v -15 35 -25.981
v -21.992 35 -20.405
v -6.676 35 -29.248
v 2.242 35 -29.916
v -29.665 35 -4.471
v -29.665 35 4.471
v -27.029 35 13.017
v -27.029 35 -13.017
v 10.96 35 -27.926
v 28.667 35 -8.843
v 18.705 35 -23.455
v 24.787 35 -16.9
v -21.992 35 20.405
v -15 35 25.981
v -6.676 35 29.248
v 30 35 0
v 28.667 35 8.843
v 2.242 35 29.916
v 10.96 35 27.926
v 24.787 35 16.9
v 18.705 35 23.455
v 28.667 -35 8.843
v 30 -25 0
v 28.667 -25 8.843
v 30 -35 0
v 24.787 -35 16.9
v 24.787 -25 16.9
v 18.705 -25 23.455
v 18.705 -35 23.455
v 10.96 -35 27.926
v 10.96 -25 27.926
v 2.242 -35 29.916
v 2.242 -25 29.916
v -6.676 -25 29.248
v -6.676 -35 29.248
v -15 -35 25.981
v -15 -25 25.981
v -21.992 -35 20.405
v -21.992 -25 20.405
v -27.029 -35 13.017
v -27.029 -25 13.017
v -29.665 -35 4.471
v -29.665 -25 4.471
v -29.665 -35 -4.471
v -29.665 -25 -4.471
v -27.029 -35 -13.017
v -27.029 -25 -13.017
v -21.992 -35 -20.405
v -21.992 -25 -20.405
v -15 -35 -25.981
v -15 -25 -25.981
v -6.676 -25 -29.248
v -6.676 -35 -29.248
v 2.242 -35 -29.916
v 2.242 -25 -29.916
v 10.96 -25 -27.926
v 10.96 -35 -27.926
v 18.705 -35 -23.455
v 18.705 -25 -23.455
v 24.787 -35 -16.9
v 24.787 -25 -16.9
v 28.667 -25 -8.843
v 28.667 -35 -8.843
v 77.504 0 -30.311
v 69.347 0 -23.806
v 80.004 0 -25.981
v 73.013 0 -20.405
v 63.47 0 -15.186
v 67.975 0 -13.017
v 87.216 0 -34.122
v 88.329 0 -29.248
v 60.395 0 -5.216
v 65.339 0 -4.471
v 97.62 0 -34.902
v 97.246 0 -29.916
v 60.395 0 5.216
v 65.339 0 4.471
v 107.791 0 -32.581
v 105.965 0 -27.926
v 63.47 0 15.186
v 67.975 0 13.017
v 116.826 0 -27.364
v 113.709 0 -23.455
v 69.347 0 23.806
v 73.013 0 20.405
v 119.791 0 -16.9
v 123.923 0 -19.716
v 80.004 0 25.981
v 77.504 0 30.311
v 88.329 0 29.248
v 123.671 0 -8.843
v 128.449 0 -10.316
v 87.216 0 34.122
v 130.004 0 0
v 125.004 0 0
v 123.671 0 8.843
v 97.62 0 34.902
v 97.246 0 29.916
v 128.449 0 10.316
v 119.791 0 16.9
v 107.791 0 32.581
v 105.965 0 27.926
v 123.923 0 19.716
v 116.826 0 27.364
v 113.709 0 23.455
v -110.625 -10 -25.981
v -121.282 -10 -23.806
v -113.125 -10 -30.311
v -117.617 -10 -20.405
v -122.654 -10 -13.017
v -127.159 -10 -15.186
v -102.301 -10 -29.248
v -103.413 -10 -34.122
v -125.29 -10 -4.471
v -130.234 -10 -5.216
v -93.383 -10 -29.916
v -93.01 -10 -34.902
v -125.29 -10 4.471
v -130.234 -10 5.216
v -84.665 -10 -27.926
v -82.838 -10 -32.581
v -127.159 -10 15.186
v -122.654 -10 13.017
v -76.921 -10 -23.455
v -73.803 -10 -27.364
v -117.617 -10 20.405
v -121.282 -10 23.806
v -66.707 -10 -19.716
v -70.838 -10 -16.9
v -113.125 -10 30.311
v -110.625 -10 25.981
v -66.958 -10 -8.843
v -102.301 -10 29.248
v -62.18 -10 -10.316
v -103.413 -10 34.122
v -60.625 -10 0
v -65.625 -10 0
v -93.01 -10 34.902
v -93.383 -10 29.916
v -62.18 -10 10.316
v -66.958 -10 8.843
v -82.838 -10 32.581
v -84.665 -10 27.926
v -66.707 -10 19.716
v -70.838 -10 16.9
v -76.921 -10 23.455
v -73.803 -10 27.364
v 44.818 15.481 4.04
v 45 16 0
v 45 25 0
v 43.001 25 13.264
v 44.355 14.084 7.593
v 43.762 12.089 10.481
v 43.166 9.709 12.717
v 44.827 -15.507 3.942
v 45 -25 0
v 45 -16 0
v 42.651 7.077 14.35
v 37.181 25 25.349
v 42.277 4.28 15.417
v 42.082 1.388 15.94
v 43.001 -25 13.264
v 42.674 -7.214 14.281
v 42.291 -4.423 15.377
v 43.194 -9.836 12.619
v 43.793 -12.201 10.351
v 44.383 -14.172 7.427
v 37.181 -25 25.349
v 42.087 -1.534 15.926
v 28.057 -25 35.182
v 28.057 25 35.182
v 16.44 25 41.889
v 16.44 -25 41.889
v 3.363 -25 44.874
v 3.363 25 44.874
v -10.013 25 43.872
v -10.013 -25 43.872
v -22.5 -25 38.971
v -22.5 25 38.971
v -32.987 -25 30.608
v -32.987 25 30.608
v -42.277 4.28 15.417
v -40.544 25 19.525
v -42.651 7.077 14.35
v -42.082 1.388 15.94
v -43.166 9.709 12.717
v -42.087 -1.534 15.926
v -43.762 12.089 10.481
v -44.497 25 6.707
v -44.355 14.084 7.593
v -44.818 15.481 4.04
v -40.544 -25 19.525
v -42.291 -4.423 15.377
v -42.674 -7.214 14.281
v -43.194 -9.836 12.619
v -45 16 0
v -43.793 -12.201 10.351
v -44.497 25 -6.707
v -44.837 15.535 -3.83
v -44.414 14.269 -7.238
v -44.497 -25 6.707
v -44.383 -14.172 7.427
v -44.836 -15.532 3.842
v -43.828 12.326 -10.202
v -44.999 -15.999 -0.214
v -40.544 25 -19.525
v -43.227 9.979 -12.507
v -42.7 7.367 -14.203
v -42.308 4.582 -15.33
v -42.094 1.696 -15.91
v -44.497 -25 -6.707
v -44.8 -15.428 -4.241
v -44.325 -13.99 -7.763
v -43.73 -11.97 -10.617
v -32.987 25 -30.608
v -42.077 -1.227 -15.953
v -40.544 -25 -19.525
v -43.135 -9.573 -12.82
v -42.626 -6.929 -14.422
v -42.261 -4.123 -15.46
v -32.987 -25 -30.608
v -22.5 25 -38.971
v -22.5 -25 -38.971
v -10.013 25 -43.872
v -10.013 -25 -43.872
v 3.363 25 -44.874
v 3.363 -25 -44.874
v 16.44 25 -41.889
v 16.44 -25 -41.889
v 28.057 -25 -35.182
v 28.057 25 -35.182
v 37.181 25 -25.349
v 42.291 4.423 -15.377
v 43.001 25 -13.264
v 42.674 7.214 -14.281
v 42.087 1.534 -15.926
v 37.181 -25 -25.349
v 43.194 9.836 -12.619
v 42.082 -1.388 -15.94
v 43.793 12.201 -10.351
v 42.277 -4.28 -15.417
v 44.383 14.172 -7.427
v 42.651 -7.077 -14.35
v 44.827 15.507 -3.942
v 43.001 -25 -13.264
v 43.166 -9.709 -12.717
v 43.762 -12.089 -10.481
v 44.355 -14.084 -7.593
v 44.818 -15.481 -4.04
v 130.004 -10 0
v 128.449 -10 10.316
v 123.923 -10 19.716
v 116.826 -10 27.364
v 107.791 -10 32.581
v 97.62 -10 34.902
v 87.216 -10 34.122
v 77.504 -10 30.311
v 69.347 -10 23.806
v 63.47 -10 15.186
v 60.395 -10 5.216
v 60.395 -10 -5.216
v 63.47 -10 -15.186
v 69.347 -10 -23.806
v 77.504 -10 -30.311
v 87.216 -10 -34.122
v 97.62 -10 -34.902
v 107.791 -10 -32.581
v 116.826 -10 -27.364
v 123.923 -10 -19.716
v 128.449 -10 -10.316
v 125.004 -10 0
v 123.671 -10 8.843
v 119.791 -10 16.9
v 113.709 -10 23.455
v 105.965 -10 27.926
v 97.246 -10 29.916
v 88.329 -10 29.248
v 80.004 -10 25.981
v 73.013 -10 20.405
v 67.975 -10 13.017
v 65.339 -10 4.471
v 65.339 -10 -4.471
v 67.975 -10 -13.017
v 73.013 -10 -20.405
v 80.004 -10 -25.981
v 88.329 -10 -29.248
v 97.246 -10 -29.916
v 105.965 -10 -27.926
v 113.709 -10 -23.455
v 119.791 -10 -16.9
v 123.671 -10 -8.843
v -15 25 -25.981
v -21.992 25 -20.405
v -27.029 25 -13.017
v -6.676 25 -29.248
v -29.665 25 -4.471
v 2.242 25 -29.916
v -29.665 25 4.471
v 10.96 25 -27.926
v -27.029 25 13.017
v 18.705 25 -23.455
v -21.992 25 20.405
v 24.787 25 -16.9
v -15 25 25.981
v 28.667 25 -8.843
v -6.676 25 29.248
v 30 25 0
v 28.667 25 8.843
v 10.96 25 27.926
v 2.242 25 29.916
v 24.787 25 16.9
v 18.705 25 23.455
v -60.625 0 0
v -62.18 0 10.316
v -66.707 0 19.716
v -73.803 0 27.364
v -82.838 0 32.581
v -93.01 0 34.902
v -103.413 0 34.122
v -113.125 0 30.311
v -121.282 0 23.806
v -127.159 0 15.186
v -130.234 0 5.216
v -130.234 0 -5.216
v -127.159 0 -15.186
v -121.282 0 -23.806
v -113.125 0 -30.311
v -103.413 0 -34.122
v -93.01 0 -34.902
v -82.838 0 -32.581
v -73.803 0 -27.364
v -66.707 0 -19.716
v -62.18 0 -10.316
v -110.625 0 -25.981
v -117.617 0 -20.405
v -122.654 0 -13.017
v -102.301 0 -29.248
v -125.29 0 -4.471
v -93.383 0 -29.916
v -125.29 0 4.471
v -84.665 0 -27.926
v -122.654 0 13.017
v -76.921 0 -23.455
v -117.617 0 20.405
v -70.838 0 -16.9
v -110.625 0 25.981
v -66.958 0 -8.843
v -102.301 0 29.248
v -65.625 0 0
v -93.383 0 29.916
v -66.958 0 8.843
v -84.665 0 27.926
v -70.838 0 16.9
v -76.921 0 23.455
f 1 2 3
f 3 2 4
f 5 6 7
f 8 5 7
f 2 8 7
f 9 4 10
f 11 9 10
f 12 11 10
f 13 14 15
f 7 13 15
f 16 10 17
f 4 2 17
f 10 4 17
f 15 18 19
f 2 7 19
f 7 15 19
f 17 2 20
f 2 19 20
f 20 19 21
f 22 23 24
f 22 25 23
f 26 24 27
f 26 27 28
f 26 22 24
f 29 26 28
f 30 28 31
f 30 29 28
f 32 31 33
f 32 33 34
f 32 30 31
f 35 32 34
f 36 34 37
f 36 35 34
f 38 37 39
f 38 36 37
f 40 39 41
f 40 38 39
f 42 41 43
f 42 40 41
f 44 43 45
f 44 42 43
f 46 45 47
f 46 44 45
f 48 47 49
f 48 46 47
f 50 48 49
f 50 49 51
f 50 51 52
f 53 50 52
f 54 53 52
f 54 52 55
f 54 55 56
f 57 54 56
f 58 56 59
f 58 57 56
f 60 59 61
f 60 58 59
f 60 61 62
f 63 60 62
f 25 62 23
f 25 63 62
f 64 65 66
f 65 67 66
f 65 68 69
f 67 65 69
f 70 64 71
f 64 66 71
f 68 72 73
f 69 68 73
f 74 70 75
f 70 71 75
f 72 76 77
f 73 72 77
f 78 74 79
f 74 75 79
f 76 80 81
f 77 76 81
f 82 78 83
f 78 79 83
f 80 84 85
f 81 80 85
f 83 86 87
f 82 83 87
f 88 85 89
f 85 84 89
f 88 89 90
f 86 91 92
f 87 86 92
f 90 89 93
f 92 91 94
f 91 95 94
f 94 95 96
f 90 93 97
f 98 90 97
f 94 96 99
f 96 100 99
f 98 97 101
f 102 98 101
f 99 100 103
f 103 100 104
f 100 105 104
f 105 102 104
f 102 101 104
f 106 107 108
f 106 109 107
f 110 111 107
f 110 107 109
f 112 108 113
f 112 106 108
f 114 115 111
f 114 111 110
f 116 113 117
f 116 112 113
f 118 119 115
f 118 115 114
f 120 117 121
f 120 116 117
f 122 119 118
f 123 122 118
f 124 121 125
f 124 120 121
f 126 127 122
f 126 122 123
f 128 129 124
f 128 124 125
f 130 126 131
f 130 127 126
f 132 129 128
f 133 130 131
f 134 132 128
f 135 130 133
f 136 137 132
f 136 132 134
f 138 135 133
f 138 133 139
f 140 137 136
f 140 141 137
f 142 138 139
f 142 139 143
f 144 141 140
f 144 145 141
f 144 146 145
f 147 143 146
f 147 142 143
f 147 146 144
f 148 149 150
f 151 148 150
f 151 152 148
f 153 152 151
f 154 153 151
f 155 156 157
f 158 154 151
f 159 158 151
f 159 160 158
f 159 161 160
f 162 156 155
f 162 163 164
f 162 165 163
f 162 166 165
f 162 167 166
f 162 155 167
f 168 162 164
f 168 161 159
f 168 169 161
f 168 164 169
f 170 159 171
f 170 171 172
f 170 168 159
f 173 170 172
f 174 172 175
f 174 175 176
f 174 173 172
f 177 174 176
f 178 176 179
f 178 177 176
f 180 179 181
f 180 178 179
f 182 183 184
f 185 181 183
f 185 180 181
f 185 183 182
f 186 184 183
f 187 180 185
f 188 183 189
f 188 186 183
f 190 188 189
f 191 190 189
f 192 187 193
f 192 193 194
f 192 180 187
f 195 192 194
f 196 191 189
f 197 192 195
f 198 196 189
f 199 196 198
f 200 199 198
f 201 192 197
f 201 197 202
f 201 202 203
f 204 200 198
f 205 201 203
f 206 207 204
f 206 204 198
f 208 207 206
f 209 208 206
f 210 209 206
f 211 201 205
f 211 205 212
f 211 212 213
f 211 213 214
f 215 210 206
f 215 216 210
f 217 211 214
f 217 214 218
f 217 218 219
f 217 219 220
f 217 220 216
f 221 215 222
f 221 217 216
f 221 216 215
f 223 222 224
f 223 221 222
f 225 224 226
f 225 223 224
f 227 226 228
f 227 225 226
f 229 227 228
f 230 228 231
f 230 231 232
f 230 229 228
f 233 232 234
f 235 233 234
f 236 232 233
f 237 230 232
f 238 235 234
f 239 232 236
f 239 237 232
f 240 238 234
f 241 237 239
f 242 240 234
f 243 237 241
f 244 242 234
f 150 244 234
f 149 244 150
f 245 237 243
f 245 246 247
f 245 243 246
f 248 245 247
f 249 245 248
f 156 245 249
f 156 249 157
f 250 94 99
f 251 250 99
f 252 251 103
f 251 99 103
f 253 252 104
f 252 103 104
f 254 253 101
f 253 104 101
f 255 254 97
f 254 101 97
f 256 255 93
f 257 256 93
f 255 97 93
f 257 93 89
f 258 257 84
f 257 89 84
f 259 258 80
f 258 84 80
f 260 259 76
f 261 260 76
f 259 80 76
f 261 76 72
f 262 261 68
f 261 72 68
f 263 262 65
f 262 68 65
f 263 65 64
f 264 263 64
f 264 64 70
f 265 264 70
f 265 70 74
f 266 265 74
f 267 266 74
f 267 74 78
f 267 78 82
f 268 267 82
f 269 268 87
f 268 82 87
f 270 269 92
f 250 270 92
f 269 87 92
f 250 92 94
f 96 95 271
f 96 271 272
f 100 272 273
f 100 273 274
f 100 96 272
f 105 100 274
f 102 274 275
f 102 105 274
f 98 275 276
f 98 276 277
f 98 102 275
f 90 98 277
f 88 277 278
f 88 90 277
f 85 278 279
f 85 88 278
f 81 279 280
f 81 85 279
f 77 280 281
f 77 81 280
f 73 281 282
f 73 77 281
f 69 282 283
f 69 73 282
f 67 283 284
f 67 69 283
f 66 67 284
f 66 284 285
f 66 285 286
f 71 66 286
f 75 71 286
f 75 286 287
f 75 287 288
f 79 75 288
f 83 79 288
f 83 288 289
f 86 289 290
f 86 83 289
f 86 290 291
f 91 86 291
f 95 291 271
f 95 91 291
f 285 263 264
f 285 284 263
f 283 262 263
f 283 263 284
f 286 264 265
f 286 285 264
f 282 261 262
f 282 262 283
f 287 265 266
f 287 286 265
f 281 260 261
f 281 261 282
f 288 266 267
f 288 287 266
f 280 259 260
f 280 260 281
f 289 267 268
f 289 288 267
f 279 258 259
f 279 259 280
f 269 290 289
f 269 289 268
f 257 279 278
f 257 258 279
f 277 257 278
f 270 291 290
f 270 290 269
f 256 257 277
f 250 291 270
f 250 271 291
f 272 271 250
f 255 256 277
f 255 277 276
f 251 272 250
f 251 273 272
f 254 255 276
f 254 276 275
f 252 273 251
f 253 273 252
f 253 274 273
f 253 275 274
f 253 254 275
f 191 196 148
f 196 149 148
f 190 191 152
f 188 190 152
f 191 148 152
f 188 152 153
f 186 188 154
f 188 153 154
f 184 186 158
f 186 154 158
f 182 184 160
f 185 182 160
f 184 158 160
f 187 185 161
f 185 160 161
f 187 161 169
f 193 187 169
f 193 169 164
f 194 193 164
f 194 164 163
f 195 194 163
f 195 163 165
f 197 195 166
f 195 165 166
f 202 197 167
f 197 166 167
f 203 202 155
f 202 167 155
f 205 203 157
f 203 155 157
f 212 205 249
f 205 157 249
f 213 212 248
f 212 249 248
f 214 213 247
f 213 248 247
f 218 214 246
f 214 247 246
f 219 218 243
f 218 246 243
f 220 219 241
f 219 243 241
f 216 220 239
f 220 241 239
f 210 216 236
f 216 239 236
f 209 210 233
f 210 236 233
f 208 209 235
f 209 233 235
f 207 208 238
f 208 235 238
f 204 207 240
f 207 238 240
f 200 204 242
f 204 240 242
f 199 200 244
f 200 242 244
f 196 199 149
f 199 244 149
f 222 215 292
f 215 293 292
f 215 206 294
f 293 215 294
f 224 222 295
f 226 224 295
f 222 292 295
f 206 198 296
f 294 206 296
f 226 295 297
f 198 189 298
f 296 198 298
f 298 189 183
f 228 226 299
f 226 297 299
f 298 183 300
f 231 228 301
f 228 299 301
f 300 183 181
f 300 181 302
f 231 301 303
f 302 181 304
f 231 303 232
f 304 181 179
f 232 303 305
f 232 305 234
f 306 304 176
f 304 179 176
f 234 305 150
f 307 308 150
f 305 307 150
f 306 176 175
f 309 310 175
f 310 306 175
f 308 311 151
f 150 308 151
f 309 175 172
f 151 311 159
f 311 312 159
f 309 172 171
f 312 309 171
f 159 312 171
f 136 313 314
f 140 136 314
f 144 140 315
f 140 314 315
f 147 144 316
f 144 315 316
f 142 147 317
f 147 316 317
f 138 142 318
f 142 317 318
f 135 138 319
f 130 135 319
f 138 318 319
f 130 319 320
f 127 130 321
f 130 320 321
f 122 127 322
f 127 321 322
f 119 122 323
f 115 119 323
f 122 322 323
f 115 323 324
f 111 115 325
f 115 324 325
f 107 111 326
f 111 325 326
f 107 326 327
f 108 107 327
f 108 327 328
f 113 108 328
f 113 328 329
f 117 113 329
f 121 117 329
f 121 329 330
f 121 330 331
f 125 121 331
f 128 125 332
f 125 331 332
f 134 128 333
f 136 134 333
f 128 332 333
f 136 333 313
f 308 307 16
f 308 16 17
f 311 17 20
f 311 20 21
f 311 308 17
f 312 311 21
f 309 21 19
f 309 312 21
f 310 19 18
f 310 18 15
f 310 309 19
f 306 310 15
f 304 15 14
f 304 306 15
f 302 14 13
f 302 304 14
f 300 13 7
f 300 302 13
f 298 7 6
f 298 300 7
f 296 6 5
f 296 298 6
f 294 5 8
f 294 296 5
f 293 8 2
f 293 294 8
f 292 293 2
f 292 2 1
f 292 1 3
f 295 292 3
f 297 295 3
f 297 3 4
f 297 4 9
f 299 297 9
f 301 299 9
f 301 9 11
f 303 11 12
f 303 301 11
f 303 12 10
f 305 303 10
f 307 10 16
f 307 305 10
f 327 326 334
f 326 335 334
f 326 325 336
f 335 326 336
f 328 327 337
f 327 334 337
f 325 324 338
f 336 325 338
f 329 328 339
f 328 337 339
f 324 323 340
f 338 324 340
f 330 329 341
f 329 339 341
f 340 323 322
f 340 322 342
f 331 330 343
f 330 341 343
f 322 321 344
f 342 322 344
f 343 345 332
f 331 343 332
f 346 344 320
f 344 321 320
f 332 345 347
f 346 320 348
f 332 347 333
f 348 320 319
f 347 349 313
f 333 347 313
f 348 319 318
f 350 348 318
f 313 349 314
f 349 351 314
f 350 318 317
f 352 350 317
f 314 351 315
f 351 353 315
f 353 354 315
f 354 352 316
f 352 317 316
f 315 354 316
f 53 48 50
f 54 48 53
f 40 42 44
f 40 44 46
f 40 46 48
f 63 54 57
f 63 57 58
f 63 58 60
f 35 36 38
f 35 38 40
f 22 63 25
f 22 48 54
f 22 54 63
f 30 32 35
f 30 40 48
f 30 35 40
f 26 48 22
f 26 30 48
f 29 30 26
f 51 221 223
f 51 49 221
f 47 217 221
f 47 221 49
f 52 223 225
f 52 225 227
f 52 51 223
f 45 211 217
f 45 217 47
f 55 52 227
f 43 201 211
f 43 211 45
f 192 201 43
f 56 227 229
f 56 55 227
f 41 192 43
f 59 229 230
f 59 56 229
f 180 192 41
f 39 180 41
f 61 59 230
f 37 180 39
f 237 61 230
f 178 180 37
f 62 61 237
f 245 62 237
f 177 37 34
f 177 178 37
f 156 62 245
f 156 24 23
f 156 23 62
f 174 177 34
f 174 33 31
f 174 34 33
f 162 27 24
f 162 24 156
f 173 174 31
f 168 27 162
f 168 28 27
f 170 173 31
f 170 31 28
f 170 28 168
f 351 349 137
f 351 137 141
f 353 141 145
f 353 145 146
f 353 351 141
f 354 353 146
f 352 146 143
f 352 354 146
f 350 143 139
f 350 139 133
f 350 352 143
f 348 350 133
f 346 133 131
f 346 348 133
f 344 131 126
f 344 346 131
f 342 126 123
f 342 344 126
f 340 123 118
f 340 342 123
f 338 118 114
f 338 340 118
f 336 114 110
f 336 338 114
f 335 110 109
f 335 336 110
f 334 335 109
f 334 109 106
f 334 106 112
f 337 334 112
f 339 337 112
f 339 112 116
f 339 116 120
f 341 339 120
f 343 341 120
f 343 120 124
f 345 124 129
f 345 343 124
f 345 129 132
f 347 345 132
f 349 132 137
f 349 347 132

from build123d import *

# Parameters (mm, degrees)
F0_R     = 30
F1_DEPTH = 35
F0_R_2   = 45
F2_DEPTH = 25
F3_R     = 16
F4_DEPTH = 45
F5_R     = 35
F5_R_2   = 30
F6_DEPTH = 10


with BuildPart() as f1:
    # F0 (on Front) → F1 (new body, symmetric)
    with BuildSketch(Plane.XZ):
        Circle(F0_R)
    extrude(amount=F1_DEPTH, both=True)

    # F0 (on Front) → F2 (join, symmetric)
    with BuildSketch(Plane.XZ):
        Circle(F0_R_2)
        Circle(F0_R, mode=Mode.SUBTRACT)
    extrude(amount=F2_DEPTH, both=True)

    # F3 (on Right) → F4 (cut, symmetric)
    with BuildSketch(Plane.YZ):
        Circle(F3_R)
    extrude(amount=F4_DEPTH, both=True, mode=Mode.SUBTRACT)


with BuildPart() as f6:
    # F5 (on Front) → F6 (new body)
    with BuildSketch(Plane.XZ):
        with Locations((95.004305, 0)):
            Circle(F5_R)
        with Locations((95.004305, 0)):
            Circle(F5_R_2, mode=Mode.SUBTRACT)
        with Locations((-95.625247, 0)):
            Circle(F5_R)
        with Locations((-95.625247, 0)):
            Circle(F5_R_2, mode=Mode.SUBTRACT)
    extrude(amount=F6_DEPTH)


solid = Compound([f1.part, f6.part])
